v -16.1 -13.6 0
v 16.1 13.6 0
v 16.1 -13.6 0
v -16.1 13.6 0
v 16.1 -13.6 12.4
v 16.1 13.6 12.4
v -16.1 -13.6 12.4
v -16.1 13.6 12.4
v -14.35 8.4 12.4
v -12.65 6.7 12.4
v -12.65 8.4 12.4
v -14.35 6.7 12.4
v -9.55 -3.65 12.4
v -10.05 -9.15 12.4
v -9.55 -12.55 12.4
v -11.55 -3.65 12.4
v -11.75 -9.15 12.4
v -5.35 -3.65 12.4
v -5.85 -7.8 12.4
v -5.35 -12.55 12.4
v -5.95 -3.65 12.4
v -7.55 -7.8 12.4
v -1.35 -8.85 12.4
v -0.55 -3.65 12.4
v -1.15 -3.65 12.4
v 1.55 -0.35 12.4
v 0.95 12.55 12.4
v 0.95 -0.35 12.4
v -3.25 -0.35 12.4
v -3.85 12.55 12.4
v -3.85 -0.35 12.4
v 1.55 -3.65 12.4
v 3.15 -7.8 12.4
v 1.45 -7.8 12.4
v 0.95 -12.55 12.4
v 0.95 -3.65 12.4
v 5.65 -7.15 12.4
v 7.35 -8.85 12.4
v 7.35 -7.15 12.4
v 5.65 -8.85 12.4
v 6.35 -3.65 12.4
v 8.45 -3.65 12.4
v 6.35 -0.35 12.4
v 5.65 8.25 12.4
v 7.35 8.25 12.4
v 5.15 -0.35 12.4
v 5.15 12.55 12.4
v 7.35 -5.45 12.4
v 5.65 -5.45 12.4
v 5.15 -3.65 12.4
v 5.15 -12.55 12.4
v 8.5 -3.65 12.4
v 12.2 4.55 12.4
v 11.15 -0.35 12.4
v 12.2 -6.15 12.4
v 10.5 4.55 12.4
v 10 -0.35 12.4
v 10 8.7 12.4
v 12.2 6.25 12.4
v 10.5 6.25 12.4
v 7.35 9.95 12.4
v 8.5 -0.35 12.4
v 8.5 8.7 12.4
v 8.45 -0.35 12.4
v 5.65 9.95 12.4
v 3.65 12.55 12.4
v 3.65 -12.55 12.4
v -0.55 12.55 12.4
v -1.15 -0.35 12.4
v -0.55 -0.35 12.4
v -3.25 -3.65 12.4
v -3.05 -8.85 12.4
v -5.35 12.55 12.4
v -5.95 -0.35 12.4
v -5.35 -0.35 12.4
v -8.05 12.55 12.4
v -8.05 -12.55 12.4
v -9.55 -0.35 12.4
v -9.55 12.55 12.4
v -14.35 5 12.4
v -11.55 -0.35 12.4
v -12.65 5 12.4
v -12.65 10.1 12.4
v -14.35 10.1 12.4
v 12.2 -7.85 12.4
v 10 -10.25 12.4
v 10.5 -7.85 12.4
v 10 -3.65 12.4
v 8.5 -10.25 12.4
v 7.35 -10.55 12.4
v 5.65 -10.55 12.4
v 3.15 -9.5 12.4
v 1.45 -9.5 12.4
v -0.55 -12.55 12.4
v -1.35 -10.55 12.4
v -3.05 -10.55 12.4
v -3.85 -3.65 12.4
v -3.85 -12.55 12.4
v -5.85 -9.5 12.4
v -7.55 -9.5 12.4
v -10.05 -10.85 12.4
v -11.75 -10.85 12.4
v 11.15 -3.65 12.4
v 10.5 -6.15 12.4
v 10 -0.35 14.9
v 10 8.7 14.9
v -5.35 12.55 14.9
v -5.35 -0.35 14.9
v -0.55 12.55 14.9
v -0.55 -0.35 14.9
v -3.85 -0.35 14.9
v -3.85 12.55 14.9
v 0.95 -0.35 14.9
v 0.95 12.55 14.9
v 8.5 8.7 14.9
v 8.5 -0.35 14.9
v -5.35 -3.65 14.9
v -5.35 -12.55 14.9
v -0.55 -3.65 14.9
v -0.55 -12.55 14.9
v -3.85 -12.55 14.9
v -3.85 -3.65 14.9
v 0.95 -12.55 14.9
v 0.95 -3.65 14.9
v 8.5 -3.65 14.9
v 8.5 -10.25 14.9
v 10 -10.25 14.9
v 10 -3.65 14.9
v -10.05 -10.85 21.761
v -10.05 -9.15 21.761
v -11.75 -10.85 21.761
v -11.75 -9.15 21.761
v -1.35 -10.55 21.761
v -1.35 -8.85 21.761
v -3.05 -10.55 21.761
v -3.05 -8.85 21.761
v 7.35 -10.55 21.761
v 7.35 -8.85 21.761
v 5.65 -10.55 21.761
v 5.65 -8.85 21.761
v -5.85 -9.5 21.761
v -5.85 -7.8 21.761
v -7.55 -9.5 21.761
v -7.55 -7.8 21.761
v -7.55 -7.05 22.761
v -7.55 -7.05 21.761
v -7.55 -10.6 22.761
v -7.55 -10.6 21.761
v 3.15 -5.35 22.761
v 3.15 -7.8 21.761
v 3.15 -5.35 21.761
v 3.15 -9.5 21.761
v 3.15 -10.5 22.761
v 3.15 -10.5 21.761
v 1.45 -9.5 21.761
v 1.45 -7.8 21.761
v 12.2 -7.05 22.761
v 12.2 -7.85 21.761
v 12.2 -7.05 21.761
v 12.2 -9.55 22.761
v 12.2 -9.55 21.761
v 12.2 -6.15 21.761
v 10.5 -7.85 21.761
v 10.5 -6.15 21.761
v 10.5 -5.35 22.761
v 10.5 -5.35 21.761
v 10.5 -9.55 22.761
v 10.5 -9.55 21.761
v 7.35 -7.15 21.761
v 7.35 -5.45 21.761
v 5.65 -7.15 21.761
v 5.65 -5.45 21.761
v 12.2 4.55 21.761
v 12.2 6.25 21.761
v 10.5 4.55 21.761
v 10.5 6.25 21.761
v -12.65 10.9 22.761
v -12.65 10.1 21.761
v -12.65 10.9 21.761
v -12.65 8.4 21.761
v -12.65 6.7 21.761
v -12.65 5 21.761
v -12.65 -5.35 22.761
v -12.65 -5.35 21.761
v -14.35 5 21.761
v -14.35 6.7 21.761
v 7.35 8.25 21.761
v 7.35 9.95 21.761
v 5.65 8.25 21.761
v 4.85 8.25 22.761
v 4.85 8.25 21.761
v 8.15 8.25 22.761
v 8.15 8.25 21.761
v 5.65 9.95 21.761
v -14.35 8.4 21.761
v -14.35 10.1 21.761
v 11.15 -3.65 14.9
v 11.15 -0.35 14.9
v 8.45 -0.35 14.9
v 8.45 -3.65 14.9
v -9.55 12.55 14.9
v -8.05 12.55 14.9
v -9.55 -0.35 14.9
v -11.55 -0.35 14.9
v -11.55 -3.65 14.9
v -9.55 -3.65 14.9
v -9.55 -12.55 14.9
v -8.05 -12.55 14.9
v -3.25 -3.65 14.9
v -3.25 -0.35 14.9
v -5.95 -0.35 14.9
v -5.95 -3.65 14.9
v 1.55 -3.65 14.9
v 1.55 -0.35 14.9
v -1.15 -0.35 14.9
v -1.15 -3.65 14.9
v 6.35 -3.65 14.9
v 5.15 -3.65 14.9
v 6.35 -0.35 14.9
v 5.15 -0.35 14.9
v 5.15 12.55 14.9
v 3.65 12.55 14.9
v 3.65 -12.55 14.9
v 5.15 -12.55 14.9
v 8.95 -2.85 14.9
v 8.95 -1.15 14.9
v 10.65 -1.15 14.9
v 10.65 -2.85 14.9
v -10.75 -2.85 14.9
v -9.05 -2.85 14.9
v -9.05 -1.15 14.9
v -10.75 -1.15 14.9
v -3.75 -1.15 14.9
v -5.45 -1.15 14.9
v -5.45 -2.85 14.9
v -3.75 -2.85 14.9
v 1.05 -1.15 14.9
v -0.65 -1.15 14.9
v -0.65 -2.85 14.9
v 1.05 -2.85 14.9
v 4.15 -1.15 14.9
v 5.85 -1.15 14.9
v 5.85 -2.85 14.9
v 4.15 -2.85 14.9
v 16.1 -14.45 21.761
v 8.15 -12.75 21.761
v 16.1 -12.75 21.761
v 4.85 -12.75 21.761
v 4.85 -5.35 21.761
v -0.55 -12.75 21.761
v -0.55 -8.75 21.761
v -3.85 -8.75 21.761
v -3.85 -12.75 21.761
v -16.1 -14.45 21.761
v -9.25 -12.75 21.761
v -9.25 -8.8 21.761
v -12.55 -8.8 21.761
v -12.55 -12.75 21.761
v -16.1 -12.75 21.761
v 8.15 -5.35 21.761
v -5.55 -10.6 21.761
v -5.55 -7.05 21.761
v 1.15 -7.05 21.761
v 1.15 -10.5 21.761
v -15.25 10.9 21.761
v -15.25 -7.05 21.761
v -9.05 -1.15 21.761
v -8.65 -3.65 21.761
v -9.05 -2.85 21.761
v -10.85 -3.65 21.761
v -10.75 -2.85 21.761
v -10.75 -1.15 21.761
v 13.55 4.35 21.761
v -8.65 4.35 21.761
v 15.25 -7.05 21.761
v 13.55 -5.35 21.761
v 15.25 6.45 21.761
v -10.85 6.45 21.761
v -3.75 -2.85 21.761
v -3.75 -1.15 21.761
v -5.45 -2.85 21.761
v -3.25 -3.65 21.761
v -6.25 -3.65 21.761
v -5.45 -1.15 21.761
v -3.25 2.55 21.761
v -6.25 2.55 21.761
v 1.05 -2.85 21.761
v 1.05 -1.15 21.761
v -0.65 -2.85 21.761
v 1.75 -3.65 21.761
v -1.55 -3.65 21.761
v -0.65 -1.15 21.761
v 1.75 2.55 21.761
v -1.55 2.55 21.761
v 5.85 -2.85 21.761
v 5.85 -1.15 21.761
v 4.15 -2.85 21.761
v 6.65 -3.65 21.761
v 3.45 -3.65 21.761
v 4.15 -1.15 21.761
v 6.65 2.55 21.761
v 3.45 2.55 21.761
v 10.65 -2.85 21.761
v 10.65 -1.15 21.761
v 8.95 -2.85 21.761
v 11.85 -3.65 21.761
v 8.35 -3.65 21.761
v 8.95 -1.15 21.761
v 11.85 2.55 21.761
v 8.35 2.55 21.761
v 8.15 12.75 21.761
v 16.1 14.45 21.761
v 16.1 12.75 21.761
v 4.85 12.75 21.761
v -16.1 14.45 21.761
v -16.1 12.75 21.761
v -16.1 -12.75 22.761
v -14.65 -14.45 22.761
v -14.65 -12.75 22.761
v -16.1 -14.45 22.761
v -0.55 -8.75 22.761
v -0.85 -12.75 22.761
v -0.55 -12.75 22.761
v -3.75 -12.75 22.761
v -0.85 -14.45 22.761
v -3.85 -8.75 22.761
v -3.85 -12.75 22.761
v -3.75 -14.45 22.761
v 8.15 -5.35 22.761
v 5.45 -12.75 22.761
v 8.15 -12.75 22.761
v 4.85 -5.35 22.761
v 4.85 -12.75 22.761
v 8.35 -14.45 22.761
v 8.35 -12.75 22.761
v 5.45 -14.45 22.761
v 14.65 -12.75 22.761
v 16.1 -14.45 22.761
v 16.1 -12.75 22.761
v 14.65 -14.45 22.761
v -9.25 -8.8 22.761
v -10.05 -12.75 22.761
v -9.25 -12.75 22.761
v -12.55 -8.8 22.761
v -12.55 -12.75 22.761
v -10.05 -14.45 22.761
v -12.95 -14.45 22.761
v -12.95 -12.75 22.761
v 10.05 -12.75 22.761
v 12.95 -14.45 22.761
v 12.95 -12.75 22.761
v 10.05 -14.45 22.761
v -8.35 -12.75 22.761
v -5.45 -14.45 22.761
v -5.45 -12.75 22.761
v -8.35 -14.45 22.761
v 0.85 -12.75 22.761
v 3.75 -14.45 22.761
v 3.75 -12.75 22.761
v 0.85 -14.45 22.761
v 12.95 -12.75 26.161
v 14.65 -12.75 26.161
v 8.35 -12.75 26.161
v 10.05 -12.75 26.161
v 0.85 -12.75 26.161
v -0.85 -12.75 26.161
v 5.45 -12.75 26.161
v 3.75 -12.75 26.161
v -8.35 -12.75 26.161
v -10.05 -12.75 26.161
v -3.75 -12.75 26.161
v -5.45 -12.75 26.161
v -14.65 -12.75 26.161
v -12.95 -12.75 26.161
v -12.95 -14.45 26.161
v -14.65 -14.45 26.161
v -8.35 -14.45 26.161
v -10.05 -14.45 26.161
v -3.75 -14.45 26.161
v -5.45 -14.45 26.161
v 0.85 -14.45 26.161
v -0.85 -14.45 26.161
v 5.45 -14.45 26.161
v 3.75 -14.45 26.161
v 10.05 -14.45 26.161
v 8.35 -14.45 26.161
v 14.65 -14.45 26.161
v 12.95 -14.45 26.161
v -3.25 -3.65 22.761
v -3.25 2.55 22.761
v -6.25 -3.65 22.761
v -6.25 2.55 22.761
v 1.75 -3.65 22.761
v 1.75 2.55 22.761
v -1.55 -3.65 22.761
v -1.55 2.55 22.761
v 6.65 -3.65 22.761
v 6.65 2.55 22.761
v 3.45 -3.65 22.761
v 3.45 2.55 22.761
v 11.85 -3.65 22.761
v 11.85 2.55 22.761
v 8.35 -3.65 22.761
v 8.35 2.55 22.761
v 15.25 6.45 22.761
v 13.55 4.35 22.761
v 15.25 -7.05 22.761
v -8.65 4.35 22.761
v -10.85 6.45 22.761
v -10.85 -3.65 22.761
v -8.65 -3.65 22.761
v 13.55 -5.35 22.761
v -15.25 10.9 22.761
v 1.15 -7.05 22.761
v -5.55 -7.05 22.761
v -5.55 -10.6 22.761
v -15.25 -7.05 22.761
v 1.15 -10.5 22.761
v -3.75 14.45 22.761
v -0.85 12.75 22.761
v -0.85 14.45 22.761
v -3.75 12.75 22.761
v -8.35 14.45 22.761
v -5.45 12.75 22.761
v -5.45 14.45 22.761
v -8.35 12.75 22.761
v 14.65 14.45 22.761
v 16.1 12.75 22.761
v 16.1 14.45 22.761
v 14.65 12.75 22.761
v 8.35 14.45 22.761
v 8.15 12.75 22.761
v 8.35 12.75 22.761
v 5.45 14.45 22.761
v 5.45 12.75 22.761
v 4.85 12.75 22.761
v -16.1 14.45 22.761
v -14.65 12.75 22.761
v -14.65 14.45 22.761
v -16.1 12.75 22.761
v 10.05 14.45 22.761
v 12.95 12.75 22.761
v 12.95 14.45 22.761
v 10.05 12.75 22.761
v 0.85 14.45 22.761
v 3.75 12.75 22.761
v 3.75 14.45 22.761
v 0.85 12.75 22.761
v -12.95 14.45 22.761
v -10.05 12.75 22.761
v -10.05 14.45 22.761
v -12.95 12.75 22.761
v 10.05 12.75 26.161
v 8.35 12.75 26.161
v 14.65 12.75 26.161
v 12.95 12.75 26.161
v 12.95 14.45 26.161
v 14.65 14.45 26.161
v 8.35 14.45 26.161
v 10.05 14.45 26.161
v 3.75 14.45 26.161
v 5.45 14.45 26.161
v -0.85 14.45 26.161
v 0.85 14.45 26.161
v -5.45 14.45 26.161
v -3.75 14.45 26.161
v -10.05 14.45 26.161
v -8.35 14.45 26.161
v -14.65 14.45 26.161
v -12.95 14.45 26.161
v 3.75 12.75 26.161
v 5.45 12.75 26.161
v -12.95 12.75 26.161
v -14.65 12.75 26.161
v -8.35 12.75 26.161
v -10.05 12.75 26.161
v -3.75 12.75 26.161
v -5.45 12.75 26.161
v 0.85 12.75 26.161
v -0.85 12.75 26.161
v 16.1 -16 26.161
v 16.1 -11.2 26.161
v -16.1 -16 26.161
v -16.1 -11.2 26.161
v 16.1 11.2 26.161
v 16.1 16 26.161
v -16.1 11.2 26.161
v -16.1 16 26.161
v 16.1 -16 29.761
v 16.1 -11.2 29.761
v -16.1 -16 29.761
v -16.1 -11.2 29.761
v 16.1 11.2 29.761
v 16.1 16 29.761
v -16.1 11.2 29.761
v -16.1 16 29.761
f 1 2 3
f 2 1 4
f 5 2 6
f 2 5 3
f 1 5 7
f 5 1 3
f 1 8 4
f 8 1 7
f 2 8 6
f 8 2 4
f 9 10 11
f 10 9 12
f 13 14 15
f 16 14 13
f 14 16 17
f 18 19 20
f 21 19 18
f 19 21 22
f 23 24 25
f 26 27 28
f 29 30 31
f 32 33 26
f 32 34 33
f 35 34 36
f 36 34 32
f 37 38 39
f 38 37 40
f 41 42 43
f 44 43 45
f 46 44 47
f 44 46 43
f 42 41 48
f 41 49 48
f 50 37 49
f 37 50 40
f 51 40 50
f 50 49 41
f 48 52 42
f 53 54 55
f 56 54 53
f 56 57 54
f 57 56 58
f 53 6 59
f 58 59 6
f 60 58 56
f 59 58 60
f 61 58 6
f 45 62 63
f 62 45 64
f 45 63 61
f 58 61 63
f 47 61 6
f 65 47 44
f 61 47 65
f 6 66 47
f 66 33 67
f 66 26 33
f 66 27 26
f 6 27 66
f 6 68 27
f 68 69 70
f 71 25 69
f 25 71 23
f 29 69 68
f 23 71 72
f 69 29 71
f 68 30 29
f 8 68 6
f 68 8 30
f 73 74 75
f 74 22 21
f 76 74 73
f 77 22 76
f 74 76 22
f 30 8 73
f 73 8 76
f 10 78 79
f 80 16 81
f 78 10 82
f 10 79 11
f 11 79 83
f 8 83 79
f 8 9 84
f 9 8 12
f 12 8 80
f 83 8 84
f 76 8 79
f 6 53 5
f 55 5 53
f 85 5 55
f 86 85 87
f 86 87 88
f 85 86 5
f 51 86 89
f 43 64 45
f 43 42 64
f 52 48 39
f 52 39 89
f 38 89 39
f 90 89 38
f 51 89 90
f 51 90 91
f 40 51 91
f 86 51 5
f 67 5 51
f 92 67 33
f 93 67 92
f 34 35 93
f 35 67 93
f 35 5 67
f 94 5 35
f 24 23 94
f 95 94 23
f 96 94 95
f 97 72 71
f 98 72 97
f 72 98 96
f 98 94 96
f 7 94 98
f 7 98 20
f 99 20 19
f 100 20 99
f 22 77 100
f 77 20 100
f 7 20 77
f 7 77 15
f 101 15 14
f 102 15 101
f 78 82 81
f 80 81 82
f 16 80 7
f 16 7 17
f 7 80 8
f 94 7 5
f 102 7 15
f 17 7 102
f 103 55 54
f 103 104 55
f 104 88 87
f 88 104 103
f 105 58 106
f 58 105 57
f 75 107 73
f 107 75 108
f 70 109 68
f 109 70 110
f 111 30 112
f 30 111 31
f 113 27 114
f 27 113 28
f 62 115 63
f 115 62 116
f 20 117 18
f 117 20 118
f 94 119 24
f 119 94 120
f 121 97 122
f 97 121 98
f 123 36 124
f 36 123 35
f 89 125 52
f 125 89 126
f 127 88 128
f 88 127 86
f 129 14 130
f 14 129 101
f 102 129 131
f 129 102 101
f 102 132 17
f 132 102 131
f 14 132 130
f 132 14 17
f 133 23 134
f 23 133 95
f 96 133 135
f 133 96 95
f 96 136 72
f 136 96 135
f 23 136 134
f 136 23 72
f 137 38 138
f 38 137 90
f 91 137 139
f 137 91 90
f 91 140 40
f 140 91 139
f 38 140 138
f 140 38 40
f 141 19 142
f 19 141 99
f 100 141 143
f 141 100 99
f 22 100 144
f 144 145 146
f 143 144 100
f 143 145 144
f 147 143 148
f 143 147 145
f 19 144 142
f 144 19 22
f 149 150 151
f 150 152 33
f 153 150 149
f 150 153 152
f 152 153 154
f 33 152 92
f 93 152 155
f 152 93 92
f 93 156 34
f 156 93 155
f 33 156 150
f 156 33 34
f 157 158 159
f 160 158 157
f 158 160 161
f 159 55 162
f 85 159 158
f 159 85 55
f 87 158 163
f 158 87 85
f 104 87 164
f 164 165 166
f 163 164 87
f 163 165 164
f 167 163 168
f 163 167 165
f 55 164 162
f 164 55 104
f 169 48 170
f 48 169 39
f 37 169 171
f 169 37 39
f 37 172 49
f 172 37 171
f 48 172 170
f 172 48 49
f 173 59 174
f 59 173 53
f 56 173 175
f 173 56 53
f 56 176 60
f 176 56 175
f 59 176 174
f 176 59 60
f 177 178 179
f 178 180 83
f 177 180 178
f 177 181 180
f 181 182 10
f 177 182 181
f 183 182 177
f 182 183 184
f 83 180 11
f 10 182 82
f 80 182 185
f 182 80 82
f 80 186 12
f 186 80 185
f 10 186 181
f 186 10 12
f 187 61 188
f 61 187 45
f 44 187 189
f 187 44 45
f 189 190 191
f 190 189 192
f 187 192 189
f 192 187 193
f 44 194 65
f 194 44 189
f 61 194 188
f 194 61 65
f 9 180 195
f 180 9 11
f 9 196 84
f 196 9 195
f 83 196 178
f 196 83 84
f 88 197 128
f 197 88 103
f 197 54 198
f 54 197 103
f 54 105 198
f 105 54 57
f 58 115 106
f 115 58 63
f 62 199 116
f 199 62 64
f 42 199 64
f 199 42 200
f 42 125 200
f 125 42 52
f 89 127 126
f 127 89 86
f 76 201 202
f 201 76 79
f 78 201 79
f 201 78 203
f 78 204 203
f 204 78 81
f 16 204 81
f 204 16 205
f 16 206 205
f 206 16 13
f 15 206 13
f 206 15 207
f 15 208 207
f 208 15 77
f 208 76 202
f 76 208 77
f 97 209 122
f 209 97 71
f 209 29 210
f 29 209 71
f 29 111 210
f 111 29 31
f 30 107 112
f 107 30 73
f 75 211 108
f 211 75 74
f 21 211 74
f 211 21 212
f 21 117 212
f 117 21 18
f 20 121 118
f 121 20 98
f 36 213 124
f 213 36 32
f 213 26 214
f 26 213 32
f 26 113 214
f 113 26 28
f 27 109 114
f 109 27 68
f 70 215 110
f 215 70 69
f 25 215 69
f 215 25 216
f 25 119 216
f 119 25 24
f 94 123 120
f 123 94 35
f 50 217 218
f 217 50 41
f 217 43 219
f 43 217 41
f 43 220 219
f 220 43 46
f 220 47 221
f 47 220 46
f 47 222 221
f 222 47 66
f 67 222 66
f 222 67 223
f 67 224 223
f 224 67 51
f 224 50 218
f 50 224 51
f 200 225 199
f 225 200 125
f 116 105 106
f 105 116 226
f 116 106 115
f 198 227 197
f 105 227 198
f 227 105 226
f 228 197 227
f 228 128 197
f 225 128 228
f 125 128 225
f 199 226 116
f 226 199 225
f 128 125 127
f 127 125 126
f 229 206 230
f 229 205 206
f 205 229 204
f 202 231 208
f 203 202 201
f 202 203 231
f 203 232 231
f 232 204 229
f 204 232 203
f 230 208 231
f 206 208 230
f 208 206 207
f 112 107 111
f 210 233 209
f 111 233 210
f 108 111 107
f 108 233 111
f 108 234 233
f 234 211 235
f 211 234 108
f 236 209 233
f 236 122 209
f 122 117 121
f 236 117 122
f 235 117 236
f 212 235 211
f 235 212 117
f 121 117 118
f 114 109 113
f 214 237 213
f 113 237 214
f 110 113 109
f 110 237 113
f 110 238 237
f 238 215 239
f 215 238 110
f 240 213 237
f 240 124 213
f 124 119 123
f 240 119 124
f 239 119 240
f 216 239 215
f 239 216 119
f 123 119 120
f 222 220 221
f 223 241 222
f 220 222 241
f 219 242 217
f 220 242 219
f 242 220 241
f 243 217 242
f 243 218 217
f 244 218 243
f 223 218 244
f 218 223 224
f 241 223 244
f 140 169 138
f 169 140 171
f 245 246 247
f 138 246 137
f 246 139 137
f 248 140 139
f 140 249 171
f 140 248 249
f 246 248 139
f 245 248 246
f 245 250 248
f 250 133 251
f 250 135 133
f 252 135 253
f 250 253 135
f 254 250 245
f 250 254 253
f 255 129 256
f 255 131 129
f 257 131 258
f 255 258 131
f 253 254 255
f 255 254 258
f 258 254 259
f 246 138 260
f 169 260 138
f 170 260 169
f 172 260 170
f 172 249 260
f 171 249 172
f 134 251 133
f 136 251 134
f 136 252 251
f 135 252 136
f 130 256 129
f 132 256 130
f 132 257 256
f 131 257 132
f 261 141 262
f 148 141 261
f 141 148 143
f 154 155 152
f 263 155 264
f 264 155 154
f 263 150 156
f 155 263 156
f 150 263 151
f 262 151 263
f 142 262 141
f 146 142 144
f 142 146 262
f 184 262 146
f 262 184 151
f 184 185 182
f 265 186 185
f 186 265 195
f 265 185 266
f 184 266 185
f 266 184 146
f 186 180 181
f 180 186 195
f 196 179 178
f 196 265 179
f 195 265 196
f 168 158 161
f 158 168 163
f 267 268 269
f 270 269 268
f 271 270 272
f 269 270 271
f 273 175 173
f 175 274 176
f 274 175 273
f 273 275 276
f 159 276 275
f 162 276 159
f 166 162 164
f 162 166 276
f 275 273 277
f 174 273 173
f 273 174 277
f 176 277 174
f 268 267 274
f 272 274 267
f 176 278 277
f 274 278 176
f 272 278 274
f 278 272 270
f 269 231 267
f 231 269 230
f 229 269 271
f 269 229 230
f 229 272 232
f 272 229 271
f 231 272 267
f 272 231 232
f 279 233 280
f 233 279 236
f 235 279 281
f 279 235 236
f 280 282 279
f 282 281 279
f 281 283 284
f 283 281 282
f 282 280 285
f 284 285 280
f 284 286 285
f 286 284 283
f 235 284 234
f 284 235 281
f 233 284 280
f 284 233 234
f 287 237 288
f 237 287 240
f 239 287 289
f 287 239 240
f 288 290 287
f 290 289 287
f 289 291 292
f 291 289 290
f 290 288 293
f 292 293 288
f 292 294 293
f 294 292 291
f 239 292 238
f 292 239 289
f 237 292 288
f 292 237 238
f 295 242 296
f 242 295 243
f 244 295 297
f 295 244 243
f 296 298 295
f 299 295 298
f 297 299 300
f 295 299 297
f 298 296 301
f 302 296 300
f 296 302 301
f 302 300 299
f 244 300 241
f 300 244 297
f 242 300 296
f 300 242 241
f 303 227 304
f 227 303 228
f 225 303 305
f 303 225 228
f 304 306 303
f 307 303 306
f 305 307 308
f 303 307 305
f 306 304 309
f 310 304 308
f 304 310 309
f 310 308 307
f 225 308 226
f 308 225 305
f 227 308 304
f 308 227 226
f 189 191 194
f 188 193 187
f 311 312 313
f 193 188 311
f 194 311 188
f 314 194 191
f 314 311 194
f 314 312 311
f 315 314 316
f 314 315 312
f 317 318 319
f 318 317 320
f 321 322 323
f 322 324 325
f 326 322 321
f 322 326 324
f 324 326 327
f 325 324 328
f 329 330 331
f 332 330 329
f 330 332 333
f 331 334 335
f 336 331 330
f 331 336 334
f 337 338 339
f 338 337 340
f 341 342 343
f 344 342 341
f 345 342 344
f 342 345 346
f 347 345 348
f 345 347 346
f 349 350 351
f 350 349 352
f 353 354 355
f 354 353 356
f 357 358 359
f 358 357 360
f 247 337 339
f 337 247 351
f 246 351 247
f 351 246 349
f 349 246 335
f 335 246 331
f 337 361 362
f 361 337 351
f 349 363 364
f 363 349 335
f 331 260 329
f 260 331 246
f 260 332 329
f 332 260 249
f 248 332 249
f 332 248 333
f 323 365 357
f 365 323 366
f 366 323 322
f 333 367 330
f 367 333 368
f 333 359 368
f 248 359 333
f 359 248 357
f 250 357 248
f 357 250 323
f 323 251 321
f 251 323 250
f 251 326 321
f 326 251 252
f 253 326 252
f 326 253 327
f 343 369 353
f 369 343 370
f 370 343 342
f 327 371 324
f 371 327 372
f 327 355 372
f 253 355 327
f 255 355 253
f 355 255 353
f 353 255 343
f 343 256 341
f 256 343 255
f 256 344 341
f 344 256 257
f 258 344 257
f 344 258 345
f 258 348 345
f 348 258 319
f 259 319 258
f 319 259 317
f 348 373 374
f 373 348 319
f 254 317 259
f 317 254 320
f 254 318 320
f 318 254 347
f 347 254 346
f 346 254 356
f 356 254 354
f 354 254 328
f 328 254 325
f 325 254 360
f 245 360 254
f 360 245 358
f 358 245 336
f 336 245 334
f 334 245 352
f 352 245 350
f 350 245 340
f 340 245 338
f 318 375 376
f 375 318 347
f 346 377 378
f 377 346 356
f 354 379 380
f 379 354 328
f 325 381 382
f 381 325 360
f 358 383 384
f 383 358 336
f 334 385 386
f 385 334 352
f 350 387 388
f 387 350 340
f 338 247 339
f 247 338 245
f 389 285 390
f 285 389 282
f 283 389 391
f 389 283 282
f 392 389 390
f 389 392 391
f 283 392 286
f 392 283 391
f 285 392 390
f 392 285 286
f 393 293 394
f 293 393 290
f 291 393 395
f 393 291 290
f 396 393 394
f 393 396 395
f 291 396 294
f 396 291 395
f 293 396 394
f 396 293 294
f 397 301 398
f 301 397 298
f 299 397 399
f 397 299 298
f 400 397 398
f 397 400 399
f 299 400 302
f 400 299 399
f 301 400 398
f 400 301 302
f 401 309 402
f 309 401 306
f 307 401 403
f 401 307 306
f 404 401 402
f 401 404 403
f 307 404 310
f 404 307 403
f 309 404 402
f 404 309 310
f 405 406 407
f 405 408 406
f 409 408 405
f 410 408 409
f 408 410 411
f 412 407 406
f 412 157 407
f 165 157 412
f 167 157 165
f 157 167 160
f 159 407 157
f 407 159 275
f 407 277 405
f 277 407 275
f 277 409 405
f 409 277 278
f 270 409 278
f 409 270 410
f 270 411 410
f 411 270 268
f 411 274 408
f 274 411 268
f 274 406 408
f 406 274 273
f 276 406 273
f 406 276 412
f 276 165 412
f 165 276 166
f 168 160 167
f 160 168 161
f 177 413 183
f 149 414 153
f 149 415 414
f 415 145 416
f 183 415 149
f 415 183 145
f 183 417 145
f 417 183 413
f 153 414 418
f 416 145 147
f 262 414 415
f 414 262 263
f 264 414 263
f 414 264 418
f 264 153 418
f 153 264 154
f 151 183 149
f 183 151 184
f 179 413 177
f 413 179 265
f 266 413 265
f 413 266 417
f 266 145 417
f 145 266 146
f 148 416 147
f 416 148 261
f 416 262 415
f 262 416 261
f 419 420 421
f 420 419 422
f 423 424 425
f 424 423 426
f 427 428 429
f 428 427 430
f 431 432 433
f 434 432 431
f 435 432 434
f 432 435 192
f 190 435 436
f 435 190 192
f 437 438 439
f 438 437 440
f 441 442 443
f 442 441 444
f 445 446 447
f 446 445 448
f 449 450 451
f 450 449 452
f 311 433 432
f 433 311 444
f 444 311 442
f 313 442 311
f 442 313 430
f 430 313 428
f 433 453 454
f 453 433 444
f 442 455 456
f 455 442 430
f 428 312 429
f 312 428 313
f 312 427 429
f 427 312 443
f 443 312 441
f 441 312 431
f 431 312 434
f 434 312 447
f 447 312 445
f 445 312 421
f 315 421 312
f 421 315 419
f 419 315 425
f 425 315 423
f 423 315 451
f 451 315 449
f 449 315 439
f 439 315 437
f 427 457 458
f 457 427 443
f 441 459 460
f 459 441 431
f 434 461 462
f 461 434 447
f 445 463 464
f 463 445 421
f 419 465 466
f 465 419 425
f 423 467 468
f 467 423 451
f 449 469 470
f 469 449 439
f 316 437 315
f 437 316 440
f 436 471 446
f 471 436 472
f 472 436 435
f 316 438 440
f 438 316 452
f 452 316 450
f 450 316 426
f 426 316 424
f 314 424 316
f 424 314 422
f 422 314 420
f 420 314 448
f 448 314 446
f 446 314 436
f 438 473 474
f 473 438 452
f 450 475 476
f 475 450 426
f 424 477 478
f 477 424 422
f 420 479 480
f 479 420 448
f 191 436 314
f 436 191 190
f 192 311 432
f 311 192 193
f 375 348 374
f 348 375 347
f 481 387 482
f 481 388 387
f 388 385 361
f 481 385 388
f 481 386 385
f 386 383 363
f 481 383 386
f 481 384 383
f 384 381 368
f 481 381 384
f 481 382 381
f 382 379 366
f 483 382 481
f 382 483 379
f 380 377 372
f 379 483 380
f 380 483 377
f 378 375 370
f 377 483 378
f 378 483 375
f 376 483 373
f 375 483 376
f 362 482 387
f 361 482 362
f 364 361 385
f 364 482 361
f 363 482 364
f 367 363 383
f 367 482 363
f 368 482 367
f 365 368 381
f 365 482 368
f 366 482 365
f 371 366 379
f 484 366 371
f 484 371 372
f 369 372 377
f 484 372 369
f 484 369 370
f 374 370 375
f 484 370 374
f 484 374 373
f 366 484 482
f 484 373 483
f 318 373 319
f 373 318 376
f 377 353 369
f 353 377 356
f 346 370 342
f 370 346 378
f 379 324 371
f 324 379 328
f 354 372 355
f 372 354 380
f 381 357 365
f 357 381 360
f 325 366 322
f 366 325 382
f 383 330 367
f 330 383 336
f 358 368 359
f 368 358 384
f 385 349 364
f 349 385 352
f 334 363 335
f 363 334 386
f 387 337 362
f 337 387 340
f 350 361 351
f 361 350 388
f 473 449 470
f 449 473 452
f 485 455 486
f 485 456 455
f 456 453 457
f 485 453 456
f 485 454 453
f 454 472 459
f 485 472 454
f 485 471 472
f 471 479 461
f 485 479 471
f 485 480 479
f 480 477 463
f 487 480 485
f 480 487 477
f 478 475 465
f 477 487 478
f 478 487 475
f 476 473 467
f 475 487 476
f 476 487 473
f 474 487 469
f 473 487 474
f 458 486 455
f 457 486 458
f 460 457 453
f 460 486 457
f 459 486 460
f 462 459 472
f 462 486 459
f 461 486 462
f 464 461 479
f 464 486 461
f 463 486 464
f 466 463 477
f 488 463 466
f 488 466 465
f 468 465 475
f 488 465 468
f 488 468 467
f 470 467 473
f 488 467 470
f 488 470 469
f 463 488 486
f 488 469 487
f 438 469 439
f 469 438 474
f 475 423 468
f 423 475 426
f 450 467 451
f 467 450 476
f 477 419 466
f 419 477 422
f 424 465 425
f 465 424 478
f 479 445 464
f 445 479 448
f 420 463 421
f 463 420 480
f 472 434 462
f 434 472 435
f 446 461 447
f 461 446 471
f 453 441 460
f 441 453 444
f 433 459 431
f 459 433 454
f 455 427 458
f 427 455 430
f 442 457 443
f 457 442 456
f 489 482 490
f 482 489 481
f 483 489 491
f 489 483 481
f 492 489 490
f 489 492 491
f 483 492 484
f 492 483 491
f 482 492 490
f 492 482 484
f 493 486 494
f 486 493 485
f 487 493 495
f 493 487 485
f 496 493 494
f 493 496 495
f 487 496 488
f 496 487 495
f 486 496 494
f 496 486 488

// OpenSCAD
// Generated by SolidPython 0.4.2 on 2020-09-29 23:21:36
//!OpenSCAD

scale(v = 0.0100000000) {
	translate(v = [-1610, -1360, 0]) {
		union() {
			color(c = [0.4000000000, 0.4000000000, 0.4000000000]) {
				translate(v = [0, 0, 0]) {
					linear_extrude(height = 1000.0000000000) {
						polygon(paths = [[0, 1, 2, 3]], points = [[0, 0], [0, 2720], [3220, 2720], [3220, 0]]);
					}
				}
			}
			color(c = [0.2000000000, 0.6000000000, 0.2000000000]) {
				translate(v = [0, 0, 1000.0000000000]) {
					linear_extrude(height = 120.0000000000) {
						polygon(paths = [[0, 1, 2, 3]], points = [[0, 1305], [0, 2720], [3220, 2720], [3220, 1305]]);
					}
				}
			}
			color(c = [0.4000000000, 0.4000000000, 0.4000000000]) {
				translate(v = [0, 0, 1000.0000000000]) {
					linear_extrude(height = 120.0000000000) {
						polygon(paths = [[0, 1, 2, 3]], points = [[0, 0], [0, 1305], [3220, 1305], [3220, 0]]);
					}
				}
			}
			color(c = [0.9000000000, 0.6000000000, 0.6000000000]) {
				translate(v = [0, 0, 1120.0000000000]) {
					linear_extrude(height = 120.0000000000) {
						polygon(paths = [[0, 1, 2, 3]], points = [[2610, 1680], [2610, 2100], [2870, 2100], [2870, 1680]]);
					}
				}
			}
			color(c = [0.9000000000, 0.6000000000, 0.6000000000]) {
				translate(v = [0, 0, 1120.0000000000]) {
					linear_extrude(height = 120.0000000000) {
						polygon(paths = [[0, 1, 2, 3]], points = [[135, 1485], [135, 2485], [655, 2485], [655, 1485]]);
					}
				}
			}
			color(c = [0.9000000000, 0.6000000000, 0.6000000000]) {
				translate(v = [0, 0, 1120.0000000000]) {
					linear_extrude(height = 120.0000000000) {
						polygon(paths = [[0, 1, 2, 3]], points = [[805, 1485], [805, 2485], [1075, 2485], [1075, 1485]]);
					}
				}
			}
			color(c = [0.9000000000, 0.6000000000, 0.6000000000]) {
				translate(v = [0, 0, 1120.0000000000]) {
					linear_extrude(height = 120.0000000000) {
						polygon(paths = [[0, 1, 2, 3]], points = [[1225, 1485], [1225, 2485], [1555, 2485], [1555, 1485]]);
					}
				}
			}
			color(c = [0.9000000000, 0.6000000000, 0.6000000000]) {
				translate(v = [0, 0, 1120.0000000000]) {
					linear_extrude(height = 120.0000000000) {
						polygon(paths = [[0, 1, 2, 3]], points = [[1705, 1485], [1705, 2485], [1975, 2485], [1975, 1485]]);
					}
				}
			}
			color(c = [0.9000000000, 0.6000000000, 0.6000000000]) {
				translate(v = [0, 0, 1120.0000000000]) {
					linear_extrude(height = 120.0000000000) {
						polygon(paths = [[0, 1, 2, 3, 4, 5, 6, 7]], points = [[2125, 1485], [2125, 2485], [2385, 2485], [2385, 2100], [2460, 2100], [2460, 1680], [2385, 1680], [2385, 1485]]);
					}
				}
			}
			color(c = [0.9000000000, 0.6000000000, 0.9000000000]) {
				translate(v = [0, 0, 1120.0000000000]) {
					linear_extrude(height = 120.0000000000) {
						polygon(paths = [[0, 1, 2, 3]], points = [[375, 235], [375, 885], [655, 885], [655, 235]]);
					}
				}
			}
			color(c = [0.9000000000, 0.6000000000, 0.9000000000]) {
				translate(v = [0, 0, 1120.0000000000]) {
					linear_extrude(height = 120.0000000000) {
						polygon(paths = [[0, 1, 2, 3]], points = [[805, 235], [805, 885], [1075, 885], [1075, 235]]);
					}
				}
			}
			color(c = [0.9000000000, 0.6000000000, 0.9000000000]) {
				translate(v = [0, 0, 1120.0000000000]) {
					linear_extrude(height = 120.0000000000) {
						polygon(paths = [[0, 1, 2, 3]], points = [[1225, 235], [1225, 885], [1555, 885], [1555, 235]]);
					}
				}
			}
			color(c = [0.9000000000, 0.6000000000, 0.9000000000]) {
				translate(v = [0, 0, 1120.0000000000]) {
					linear_extrude(height = 120.0000000000) {
						polygon(paths = [[0, 1, 2, 3]], points = [[1705, 235], [1705, 885], [1975, 885], [1975, 235]]);
					}
				}
			}
			color(c = [0.9000000000, 0.6000000000, 0.9000000000]) {
				translate(v = [0, 0, 1120.0000000000]) {
					linear_extrude(height = 120.0000000000) {
						polygon(paths = [[0, 1, 2, 3, 4, 5]], points = [[2125, 235], [2125, 885], [2460, 885], [2460, 465], [2385, 465], [2385, 235]]);
					}
				}
			}
			color(c = [0.9000000000, 0.6000000000, 0.9000000000]) {
				translate(v = [0, 0, 1120.0000000000]) {
					linear_extrude(height = 120.0000000000) {
						polygon(paths = [[0, 1, 2, 3]], points = [[2610, 465], [2610, 885], [2870, 885], [2870, 465]]);
					}
				}
			}
			color(c = [0.2000000000, 0.6000000000, 0.2000000000]) {
				translate(v = [0, 0, 1120.0000000000]) {
					linear_extrude(height = 120.0000000000) {
						difference() {
							polygon(paths = [[0, 1, 2, 3]], points = [[0, 1305], [0, 2720], [3220, 2720], [3220, 1305]]);
							polygon(paths = [[0, 1, 2, 3]], points = [[135, 1485], [655, 1485], [655, 2485], [135, 2485]]);
							polygon(paths = [[0, 1, 2, 3]], points = [[805, 1485], [1075, 1485], [1075, 2485], [805, 2485]]);
							polygon(paths = [[0, 1, 2, 3]], points = [[1225, 1485], [1555, 1485], [1555, 2485], [1225, 2485]]);
							polygon(paths = [[0, 1, 2, 3]], points = [[1705, 1485], [1975, 1485], [1975, 2485], [1705, 2485]]);
							polygon(paths = [[0, 1, 2, 3]], points = [[2610, 1680], [2870, 1680], [2870, 2100], [2610, 2100]]);
							polygon(paths = [[0, 1, 2, 3, 4, 5, 6, 7]], points = [[2125, 1485], [2385, 1485], [2385, 1680], [2460, 1680], [2460, 2100], [2385, 2100], [2385, 2485], [2125, 2485]]);
						}
					}
				}
			}
			color(c = [0.4000000000, 0.4000000000, 0.4000000000]) {
				translate(v = [0, 0, 1120.0000000000]) {
					linear_extrude(height = 120.0000000000) {
						difference() {
							polygon(paths = [[0, 1, 2, 3]], points = [[0, 0], [0, 1305], [3220, 1305], [3220, 0]]);
							polygon(paths = [[0, 1, 2, 3]], points = [[375, 235], [655, 235], [655, 885], [375, 885]]);
							polygon(paths = [[0, 1, 2, 3]], points = [[805, 235], [1075, 235], [1075, 885], [805, 885]]);
							polygon(paths = [[0, 1, 2, 3]], points = [[1225, 235], [1555, 235], [1555, 885], [1225, 885]]);
							polygon(paths = [[0, 1, 2, 3]], points = [[1705, 235], [1975, 235], [1975, 885], [1705, 885]]);
							polygon(paths = [[0, 1, 2, 3]], points = [[2610, 465], [2870, 465], [2870, 885], [2610, 885]]);
							polygon(paths = [[0, 1, 2, 3, 4, 5]], points = [[2125, 235], [2385, 235], [2385, 465], [2460, 465], [2460, 885], [2125, 885]]);
						}
					}
				}
			}
			color(c = [0.1000000000, 0.1000000000, 0.1000000000]) {
				translate(v = [0, 0, 1240.0000000000]) {
					linear_extrude(height = 70.0000000000) {
						polygon(paths = [[0, 1, 2, 3]], points = [[435, 275], [435, 445], [605, 445], [605, 275]]);
					}
				}
			}
			color(c = [0.1000000000, 0.1000000000, 0.1000000000]) {
				translate(v = [0, 0, 1240.0000000000]) {
					linear_extrude(height = 70.0000000000) {
						polygon(paths = [[0, 1, 2, 3]], points = [[1305, 305], [1305, 475], [1475, 475], [1475, 305]]);
					}
				}
			}
			color(c = [0.1000000000, 0.1000000000, 0.1000000000]) {
				translate(v = [0, 0, 1240.0000000000]) {
					linear_extrude(height = 70.0000000000) {
						polygon(paths = [[0, 1, 2, 3]], points = [[2175, 305], [2175, 475], [2345, 475], [2345, 305]]);
					}
				}
			}
			color(c = [0.1000000000, 0.1000000000, 0.1000000000]) {
				translate(v = [0, 0, 1240.0000000000]) {
					linear_extrude(height = 70.0000000000) {
						polygon(paths = [[0, 1, 2, 3]], points = [[855, 410], [855, 580], [1025, 580], [1025, 410]]);
					}
				}
			}
			color(c = [0.1000000000, 0.1000000000, 0.1000000000]) {
				translate(v = [0, 0, 1240.0000000000]) {
					linear_extrude(height = 70.0000000000) {
						polygon(paths = [[0, 1, 2, 3]], points = [[1755, 410], [1755, 580], [1925, 580], [1925, 410]]);
					}
				}
			}
			color(c = [0.1000000000, 0.1000000000, 0.1000000000]) {
				translate(v = [0, 0, 1240.0000000000]) {
					linear_extrude(height = 70.0000000000) {
						polygon(paths = [[0, 1, 2, 3]], points = [[2660, 575], [2660, 745], [2830, 745], [2830, 575]]);
					}
				}
			}
			color(c = [0.1000000000, 0.1000000000, 0.1000000000]) {
				translate(v = [0, 0, 1240.0000000000]) {
					linear_extrude(height = 70.0000000000) {
						polygon(paths = [[0, 1, 2, 3]], points = [[2175, 645], [2175, 815], [2345, 815], [2345, 645]]);
					}
				}
			}
			color(c = [0.1000000000, 0.1000000000, 0.1000000000]) {
				translate(v = [0, 0, 1240.0000000000]) {
					linear_extrude(height = 70.0000000000) {
						polygon(paths = [[0, 1, 2, 3]], points = [[2660, 1815], [2660, 1985], [2830, 1985], [2830, 1815]]);
					}
				}
			}
			color(c = [0.1000000000, 0.1000000000, 0.1000000000]) {
				translate(v = [0, 0, 1240.0000000000]) {
					linear_extrude(height = 70.0000000000) {
						polygon(paths = [[0, 1, 2, 3]], points = [[175, 1860], [175, 2030], [345, 2030], [345, 1860]]);
					}
				}
			}
			color(c = [0.1000000000, 0.1000000000, 0.1000000000]) {
				translate(v = [0, 0, 1240.0000000000]) {
					linear_extrude(height = 70.0000000000) {
						polygon(paths = [[0, 1, 2, 3]], points = [[2175, 2185], [2175, 2355], [2345, 2355], [2345, 2185]]);
					}
				}
			}
			color(c = [0.1000000000, 0.1000000000, 0.1000000000]) {
				translate(v = [0, 0, 1240.0000000000]) {
					linear_extrude(height = 70.0000000000) {
						polygon(paths = [[0, 1, 2, 3]], points = [[175, 2200], [175, 2370], [345, 2370], [345, 2200]]);
					}
				}
			}
			color(c = [1.0000000000, 1.0000000000, 1.0000000000]) {
				translate(v = [0, 0, 1240.0000000000]) {
					linear_extrude(height = 70.0000000000) {
						polygon(paths = [[0, 1, 2, 3, 4, 5, 6, 7, 8, 9, 10, 11]], points = [[2460, 335], [2460, 995], [2455, 995], [2455, 1325], [2460, 1325], [2460, 2230], [2610, 2230], [2610, 1325], [2725, 1325], [2725, 995], [2610, 995], [2610, 335]]);
					}
				}
			}
			color(c = [1.0000000000, 1.0000000000, 1.0000000000]) {
				translate(v = [0, 0, 1240.0000000000]) {
					linear_extrude(height = 70.0000000000) {
						polygon(paths = [[0, 1, 2, 3, 4, 5, 6, 7]], points = [[655, 105], [655, 995], [455, 995], [455, 1325], [655, 1325], [655, 2615], [805, 2615], [805, 105]]);
					}
				}
			}
			color(c = [1.0000000000, 1.0000000000, 1.0000000000]) {
				translate(v = [0, 0, 1240.0000000000]) {
					linear_extrude(height = 70.0000000000) {
						polygon(paths = [[0, 1, 2, 3, 4, 5, 6, 7, 8, 9, 10, 11]], points = [[1075, 105], [1075, 995], [1015, 995], [1015, 1325], [1075, 1325], [1075, 2615], [1225, 2615], [1225, 1325], [1285, 1325], [1285, 995], [1225, 995], [1225, 105]]);
					}
				}
			}
			color(c = [1.0000000000, 1.0000000000, 1.0000000000]) {
				translate(v = [0, 0, 1240.0000000000]) {
					linear_extrude(height = 70.0000000000) {
						polygon(paths = [[0, 1, 2, 3, 4, 5, 6, 7, 8, 9, 10, 11]], points = [[1555, 105], [1555, 995], [1495, 995], [1495, 1325], [1555, 1325], [1555, 2615], [1705, 2615], [1705, 1325], [1765, 1325], [1765, 995], [1705, 995], [1705, 105]]);
					}
				}
			}
			color(c = [1.0000000000, 1.0000000000, 1.0000000000]) {
				translate(v = [0, 0, 1240.0000000000]) {
					linear_extrude(height = 70.0000000000) {
						polygon(paths = [[0, 1, 2, 3, 4, 5, 6, 7]], points = [[1975, 105], [1975, 2615], [2125, 2615], [2125, 1325], [2245, 1325], [2245, 995], [2125, 995], [2125, 105]]);
					}
				}
			}
			color(c = [0.1000000000, 0.1000000000, 0.1000000000]) {
				translate(v = [0, 0, 1310.0000000000]) {
					linear_extrude(height = 180.0000000000) {
						polygon(paths = [[0, 1, 2, 3]], points = [[435, 275], [435, 445], [605, 445], [605, 275]]);
					}
				}
			}
			color(c = [0.1000000000, 0.1000000000, 0.1000000000]) {
				translate(v = [0, 0, 1310.0000000000]) {
					linear_extrude(height = 180.0000000000) {
						polygon(paths = [[0, 1, 2, 3]], points = [[1305, 305], [1305, 475], [1475, 475], [1475, 305]]);
					}
				}
			}
			color(c = [0.1000000000, 0.1000000000, 0.1000000000]) {
				translate(v = [0, 0, 1310.0000000000]) {
					linear_extrude(height = 180.0000000000) {
						polygon(paths = [[0, 1, 2, 3]], points = [[2175, 305], [2175, 475], [2345, 475], [2345, 305]]);
					}
				}
			}
			color(c = [0.1000000000, 0.1000000000, 0.1000000000]) {
				translate(v = [0, 0, 1310.0000000000]) {
					linear_extrude(height = 180.0000000000) {
						polygon(paths = [[0, 1, 2, 3]], points = [[855, 410], [855, 580], [1025, 580], [1025, 410]]);
					}
				}
			}
			color(c = [0.1000000000, 0.1000000000, 0.1000000000]) {
				translate(v = [0, 0, 1310.0000000000]) {
					linear_extrude(height = 180.0000000000) {
						polygon(paths = [[0, 1, 2, 3]], points = [[1755, 410], [1755, 580], [1925, 580], [1925, 410]]);
					}
				}
			}
			color(c = [0.1000000000, 0.1000000000, 0.1000000000]) {
				translate(v = [0, 0, 1310.0000000000]) {
					linear_extrude(height = 180.0000000000) {
						polygon(paths = [[0, 1, 2, 3]], points = [[2660, 575], [2660, 745], [2830, 745], [2830, 575]]);
					}
				}
			}
			color(c = [0.1000000000, 0.1000000000, 0.1000000000]) {
				translate(v = [0, 0, 1310.0000000000]) {
					linear_extrude(height = 180.0000000000) {
						polygon(paths = [[0, 1, 2, 3]], points = [[2175, 645], [2175, 815], [2345, 815], [2345, 645]]);
					}
				}
			}
			color(c = [0.1000000000, 0.1000000000, 0.1000000000]) {
				translate(v = [0, 0, 1310.0000000000]) {
					linear_extrude(height = 180.0000000000) {
						polygon(paths = [[0, 1, 2, 3]], points = [[2660, 1815], [2660, 1985], [2830, 1985], [2830, 1815]]);
					}
				}
			}
			color(c = [0.1000000000, 0.1000000000, 0.1000000000]) {
				translate(v = [0, 0, 1310.0000000000]) {
					linear_extrude(height = 180.0000000000) {
						polygon(paths = [[0, 1, 2, 3]], points = [[175, 1860], [175, 2030], [345, 2030], [345, 1860]]);
					}
				}
			}
			color(c = [0.1000000000, 0.1000000000, 0.1000000000]) {
				translate(v = [0, 0, 1310.0000000000]) {
					linear_extrude(height = 180.0000000000) {
						polygon(paths = [[0, 1, 2, 3]], points = [[2175, 2185], [2175, 2355], [2345, 2355], [2345, 2185]]);
					}
				}
			}
			color(c = [0.1000000000, 0.1000000000, 0.1000000000]) {
				translate(v = [0, 0, 1310.0000000000]) {
					linear_extrude(height = 180.0000000000) {
						polygon(paths = [[0, 1, 2, 3]], points = [[175, 2200], [175, 2370], [345, 2370], [345, 2200]]);
					}
				}
			}
			color(c = [0.7000000000, 0, 0]) {
				translate(v = [0, 0, 1310.0000000000]) {
					linear_extrude(height = 180.0000000000) {
						polygon(paths = [[0, 1, 2, 3, 4, 5, 6, 7, 8, 9, 10, 11]], points = [[2460, 335], [2460, 995], [2455, 995], [2455, 1325], [2460, 1325], [2460, 2230], [2610, 2230], [2610, 1325], [2725, 1325], [2725, 995], [2610, 995], [2610, 335]]);
					}
				}
			}
			color(c = [0.7000000000, 0, 0]) {
				translate(v = [0, 0, 1310.0000000000]) {
					linear_extrude(height = 180.0000000000) {
						polygon(paths = [[0, 1, 2, 3, 4, 5, 6, 7]], points = [[655, 105], [655, 995], [455, 995], [455, 1325], [655, 1325], [655, 2615], [805, 2615], [805, 105]]);
					}
				}
			}
			color(c = [0.7000000000, 0, 0]) {
				translate(v = [0, 0, 1310.0000000000]) {
					linear_extrude(height = 180.0000000000) {
						polygon(paths = [[0, 1, 2, 3, 4, 5, 6, 7, 8, 9, 10, 11]], points = [[1075, 105], [1075, 995], [1015, 995], [1015, 1325], [1075, 1325], [1075, 2615], [1225, 2615], [1225, 1325], [1285, 1325], [1285, 995], [1225, 995], [1225, 105]]);
					}
				}
			}
			color(c = [0.7000000000, 0, 0]) {
				translate(v = [0, 0, 1310.0000000000]) {
					linear_extrude(height = 180.0000000000) {
						polygon(paths = [[0, 1, 2, 3, 4, 5, 6, 7, 8, 9, 10, 11]], points = [[1555, 105], [1555, 995], [1495, 995], [1495, 1325], [1555, 1325], [1555, 2615], [1705, 2615], [1705, 1325], [1765, 1325], [1765, 995], [1705, 995], [1705, 105]]);
					}
				}
			}
			color(c = [0.7000000000, 0, 0]) {
				translate(v = [0, 0, 1310.0000000000]) {
					linear_extrude(height = 180.0000000000) {
						polygon(paths = [[0, 1, 2, 3, 4, 5, 6, 7]], points = [[1975, 105], [1975, 2615], [2125, 2615], [2125, 1325], [2245, 1325], [2245, 995], [2125, 995], [2125, 105]]);
					}
				}
			}
			color(c = [0.1000000000, 0.1000000000, 0.1000000000]) {
				translate(v = [0, 0, 1490.0000000000]) {
					linear_extrude(height = 686.1000000000) {
						polygon(paths = [[0, 1, 2, 3]], points = [[435, 275], [435, 445], [605, 445], [605, 275]]);
					}
				}
			}
			color(c = [0.1000000000, 0.1000000000, 0.1000000000]) {
				translate(v = [0, 0, 1490.0000000000]) {
					linear_extrude(height = 686.1000000000) {
						polygon(paths = [[0, 1, 2, 3]], points = [[1305, 305], [1305, 475], [1475, 475], [1475, 305]]);
					}
				}
			}
			color(c = [0.1000000000, 0.1000000000, 0.1000000000]) {
				translate(v = [0, 0, 1490.0000000000]) {
					linear_extrude(height = 686.1000000000) {
						polygon(paths = [[0, 1, 2, 3]], points = [[2175, 305], [2175, 475], [2345, 475], [2345, 305]]);
					}
				}
			}
			color(c = [0.1000000000, 0.1000000000, 0.1000000000]) {
				translate(v = [0, 0, 1490.0000000000]) {
					linear_extrude(height = 686.1000000000) {
						polygon(paths = [[0, 1, 2, 3]], points = [[855, 410], [855, 580], [1025, 580], [1025, 410]]);
					}
				}
			}
			color(c = [0.1000000000, 0.1000000000, 0.1000000000]) {
				translate(v = [0, 0, 1490.0000000000]) {
					linear_extrude(height = 686.1000000000) {
						polygon(paths = [[0, 1, 2, 3]], points = [[1755, 410], [1755, 580], [1925, 580], [1925, 410]]);
					}
				}
			}
			color(c = [0.1000000000, 0.1000000000, 0.1000000000]) {
				translate(v = [0, 0, 1490.0000000000]) {
					linear_extrude(height = 686.1000000000) {
						polygon(paths = [[0, 1, 2, 3]], points = [[2660, 575], [2660, 745], [2830, 745], [2830, 575]]);
					}
				}
			}
			color(c = [0.1000000000, 0.1000000000, 0.1000000000]) {
				translate(v = [0, 0, 1490.0000000000]) {
					linear_extrude(height = 686.1000000000) {
						polygon(paths = [[0, 1, 2, 3]], points = [[2175, 645], [2175, 815], [2345, 815], [2345, 645]]);
					}
				}
			}
			color(c = [0.1000000000, 0.1000000000, 0.1000000000]) {
				translate(v = [0, 0, 1490.0000000000]) {
					linear_extrude(height = 686.1000000000) {
						polygon(paths = [[0, 1, 2, 3]], points = [[535, 1075], [535, 1245], [705, 1245], [705, 1075]]);
					}
				}
			}
			color(c = [0.1000000000, 0.1000000000, 0.1000000000]) {
				translate(v = [0, 0, 1490.0000000000]) {
					linear_extrude(height = 686.1000000000) {
						polygon(paths = [[0, 1, 2, 3]], points = [[1065, 1075], [1065, 1245], [1235, 1245], [1235, 1075]]);
					}
				}
			}
			color(c = [0.1000000000, 0.1000000000, 0.1000000000]) {
				translate(v = [0, 0, 1490.0000000000]) {
					linear_extrude(height = 686.1000000000) {
						polygon(paths = [[0, 1, 2, 3]], points = [[1545, 1075], [1545, 1245], [1715, 1245], [1715, 1075]]);
					}
				}
			}
			color(c = [0.1000000000, 0.1000000000, 0.1000000000]) {
				translate(v = [0, 0, 1490.0000000000]) {
					linear_extrude(height = 686.1000000000) {
						polygon(paths = [[0, 1, 2, 3]], points = [[2025, 1075], [2025, 1245], [2195, 1245], [2195, 1075]]);
					}
				}
			}
			color(c = [0.1000000000, 0.1000000000, 0.1000000000]) {
				translate(v = [0, 0, 1490.0000000000]) {
					linear_extrude(height = 686.1000000000) {
						polygon(paths = [[0, 1, 2, 3]], points = [[2505, 1075], [2505, 1245], [2675, 1245], [2675, 1075]]);
					}
				}
			}
			color(c = [0.1000000000, 0.1000000000, 0.1000000000]) {
				translate(v = [0, 0, 1490.0000000000]) {
					linear_extrude(height = 686.1000000000) {
						polygon(paths = [[0, 1, 2, 3]], points = [[2660, 1815], [2660, 1985], [2830, 1985], [2830, 1815]]);
					}
				}
			}
			color(c = [0.1000000000, 0.1000000000, 0.1000000000]) {
				translate(v = [0, 0, 1490.0000000000]) {
					linear_extrude(height = 686.1000000000) {
						polygon(paths = [[0, 1, 2, 3]], points = [[175, 1860], [175, 2030], [345, 2030], [345, 1860]]);
					}
				}
			}
			color(c = [0.1000000000, 0.1000000000, 0.1000000000]) {
				translate(v = [0, 0, 1490.0000000000]) {
					linear_extrude(height = 686.1000000000) {
						polygon(paths = [[0, 1, 2, 3]], points = [[2175, 2185], [2175, 2355], [2345, 2355], [2345, 2185]]);
					}
				}
			}
			color(c = [0.1000000000, 0.1000000000, 0.1000000000]) {
				translate(v = [0, 0, 1490.0000000000]) {
					linear_extrude(height = 686.1000000000) {
						polygon(paths = [[0, 1, 2, 3]], points = [[175, 2200], [175, 2370], [345, 2370], [345, 2200]]);
					}
				}
			}
			color(c = [0.9000000000, 0.6000000000, 0.6000000000]) {
				translate(v = [0, 0, 2176.1000000000]) {
					linear_extrude(height = 100.0000000000) {
						polygon(paths = [[0, 1, 2, 3, 4, 5, 6, 7, 8, 9, 10, 11, 12, 13, 14, 15]], points = [[0, -85], [0, 85], [355, 85], [355, 480], [685, 480], [685, 85], [1225, 85], [1225, 485], [1555, 485], [1555, 85], [2095, 85], [2095, 825], [2425, 825], [2425, 85], [3220, 85], [3220, -85]]);
					}
				}
			}
			color(c = [0.9000000000, 0.6000000000, 0.6000000000]) {
				translate(v = [0, 0, 2176.1000000000]) {
					linear_extrude(height = 100.0000000000) {
						polygon(paths = [[0, 1, 2, 3]], points = [[985, 995], [985, 1615], [1285, 1615], [1285, 995]]);
					}
				}
			}
			color(c = [0.9000000000, 0.6000000000, 0.6000000000]) {
				translate(v = [0, 0, 2176.1000000000]) {
					linear_extrude(height = 100.0000000000) {
						polygon(paths = [[0, 1, 2, 3]], points = [[1455, 995], [1455, 1615], [1785, 1615], [1785, 995]]);
					}
				}
			}
			color(c = [0.9000000000, 0.6000000000, 0.6000000000]) {
				translate(v = [0, 0, 2176.1000000000]) {
					linear_extrude(height = 100.0000000000) {
						polygon(paths = [[0, 1, 2, 3]], points = [[1955, 995], [1955, 1615], [2275, 1615], [2275, 995]]);
					}
				}
			}
			color(c = [0.9000000000, 0.6000000000, 0.6000000000]) {
				translate(v = [0, 0, 2176.1000000000]) {
					linear_extrude(height = 100.0000000000) {
						polygon(paths = [[0, 1, 2, 3]], points = [[2445, 995], [2445, 1615], [2795, 1615], [2795, 995]]);
					}
				}
			}
			color(c = [0.9000000000, 0.6000000000, 0.6000000000]) {
				translate(v = [0, 0, 2176.1000000000]) {
					linear_extrude(height = 100.0000000000) {
						polygon(paths = [[0, 1, 2, 3, 4, 5, 6, 7, 8, 9, 10, 11]], points = [[2660, 405], [2660, 825], [2965, 825], [2965, 1795], [745, 1795], [745, 995], [525, 995], [525, 2005], [3135, 2005], [3135, 655], [2830, 655], [2830, 405]]);
					}
				}
			}
			color(c = [0.9000000000, 0.6000000000, 0.6000000000]) {
				translate(v = [0, 0, 2176.1000000000]) {
					linear_extrude(height = 100.0000000000) {
						polygon(paths = [[0, 1, 2, 3, 4, 5, 6, 7, 8, 9, 10, 11]], points = [[855, 300], [855, 655], [85, 655], [85, 2450], [345, 2450], [345, 825], [1925, 825], [1925, 310], [1725, 310], [1725, 655], [1055, 655], [1055, 300]]);
					}
				}
			}
			color(c = [0.9000000000, 0.6000000000, 0.6000000000]) {
				translate(v = [0, 0, 2176.1000000000]) {
					linear_extrude(height = 100.0000000000) {
						polygon(paths = [[0, 1, 2, 3, 4, 5, 6, 7]], points = [[2095, 2185], [2095, 2635], [0, 2635], [0, 2805], [3220, 2805], [3220, 2635], [2425, 2635], [2425, 2185]]);
					}
				}
			}
			color(c = [0.5000000000, 0.5000000000, 0.5000000000]) {
				translate(v = [0, 0, 2276.1000000000]) {
					linear_extrude(height = 340.0000000000) {
						polygon(paths = [[0, 1, 2, 3]], points = [[145, -85], [145, 85], [315, 85], [315, -85]]);
					}
				}
			}
			color(c = [0.5000000000, 0.5000000000, 0.5000000000]) {
				translate(v = [0, 0, 2276.1000000000]) {
					linear_extrude(height = 340.0000000000) {
						polygon(paths = [[0, 1, 2, 3]], points = [[605, -85], [605, 85], [775, 85], [775, -85]]);
					}
				}
			}
			color(c = [0.5000000000, 0.5000000000, 0.5000000000]) {
				translate(v = [0, 0, 2276.1000000000]) {
					linear_extrude(height = 340.0000000000) {
						polygon(paths = [[0, 1, 2, 3]], points = [[1065, -85], [1065, 85], [1235, 85], [1235, -85]]);
					}
				}
			}
			color(c = [0.5000000000, 0.5000000000, 0.5000000000]) {
				translate(v = [0, 0, 2276.1000000000]) {
					linear_extrude(height = 340.0000000000) {
						polygon(paths = [[0, 1, 2, 3]], points = [[1525, -85], [1525, 85], [1695, 85], [1695, -85]]);
					}
				}
			}
			color(c = [0.5000000000, 0.5000000000, 0.5000000000]) {
				translate(v = [0, 0, 2276.1000000000]) {
					linear_extrude(height = 340.0000000000) {
						polygon(paths = [[0, 1, 2, 3]], points = [[1985, -85], [1985, 85], [2155, 85], [2155, -85]]);
					}
				}
			}
			color(c = [0.5000000000, 0.5000000000, 0.5000000000]) {
				translate(v = [0, 0, 2276.1000000000]) {
					linear_extrude(height = 340.0000000000) {
						polygon(paths = [[0, 1, 2, 3]], points = [[2445, -85], [2445, 85], [2615, 85], [2615, -85]]);
					}
				}
			}
			color(c = [0.5000000000, 0.5000000000, 0.5000000000]) {
				translate(v = [0, 0, 2276.1000000000]) {
					linear_extrude(height = 340.0000000000) {
						polygon(paths = [[0, 1, 2, 3]], points = [[2905, -85], [2905, 85], [3075, 85], [3075, -85]]);
					}
				}
			}
			color(c = [0.5000000000, 0.5000000000, 0.5000000000]) {
				translate(v = [0, 0, 2276.1000000000]) {
					linear_extrude(height = 340.0000000000) {
						polygon(paths = [[0, 1, 2, 3]], points = [[145, 2635], [145, 2805], [315, 2805], [315, 2635]]);
					}
				}
			}
			color(c = [0.5000000000, 0.5000000000, 0.5000000000]) {
				translate(v = [0, 0, 2276.1000000000]) {
					linear_extrude(height = 340.0000000000) {
						polygon(paths = [[0, 1, 2, 3]], points = [[605, 2635], [605, 2805], [775, 2805], [775, 2635]]);
					}
				}
			}
			color(c = [0.5000000000, 0.5000000000, 0.5000000000]) {
				translate(v = [0, 0, 2276.1000000000]) {
					linear_extrude(height = 340.0000000000) {
						polygon(paths = [[0, 1, 2, 3]], points = [[1065, 2635], [1065, 2805], [1235, 2805], [1235, 2635]]);
					}
				}
			}
			color(c = [0.5000000000, 0.5000000000, 0.5000000000]) {
				translate(v = [0, 0, 2276.1000000000]) {
					linear_extrude(height = 340.0000000000) {
						polygon(paths = [[0, 1, 2, 3]], points = [[1525, 2635], [1525, 2805], [1695, 2805], [1695, 2635]]);
					}
				}
			}
			color(c = [0.5000000000, 0.5000000000, 0.5000000000]) {
				translate(v = [0, 0, 2276.1000000000]) {
					linear_extrude(height = 340.0000000000) {
						polygon(paths = [[0, 1, 2, 3]], points = [[1985, 2635], [1985, 2805], [2155, 2805], [2155, 2635]]);
					}
				}
			}
			color(c = [0.5000000000, 0.5000000000, 0.5000000000]) {
				translate(v = [0, 0, 2276.1000000000]) {
					linear_extrude(height = 340.0000000000) {
						polygon(paths = [[0, 1, 2, 3]], points = [[2445, 2635], [2445, 2805], [2615, 2805], [2615, 2635]]);
					}
				}
			}
			color(c = [0.5000000000, 0.5000000000, 0.5000000000]) {
				translate(v = [0, 0, 2276.1000000000]) {
					linear_extrude(height = 340.0000000000) {
						polygon(paths = [[0, 1, 2, 3]], points = [[2905, 2635], [2905, 2805], [3075, 2805], [3075, 2635]]);
					}
				}
			}
			color(c = [0.3000000000, 0.3000000000, 1]) {
				translate(v = [0, 0, 2616.1000000000]) {
					linear_extrude(height = 360.0000000000) {
						polygon(paths = [[0, 1, 2, 3]], points = [[0, -240], [0, 240], [3220, 240], [3220, -240]]);
					}
				}
			}
			color(c = [0.3000000000, 0.3000000000, 1]) {
				translate(v = [0, 0, 2616.1000000000]) {
					linear_extrude(height = 360.0000000000) {
						polygon(paths = [[0, 1, 2, 3]], points = [[0, 2480], [0, 2960], [3220, 2960], [3220, 2480]]);
					}
				}
			}
		}
	}
}
